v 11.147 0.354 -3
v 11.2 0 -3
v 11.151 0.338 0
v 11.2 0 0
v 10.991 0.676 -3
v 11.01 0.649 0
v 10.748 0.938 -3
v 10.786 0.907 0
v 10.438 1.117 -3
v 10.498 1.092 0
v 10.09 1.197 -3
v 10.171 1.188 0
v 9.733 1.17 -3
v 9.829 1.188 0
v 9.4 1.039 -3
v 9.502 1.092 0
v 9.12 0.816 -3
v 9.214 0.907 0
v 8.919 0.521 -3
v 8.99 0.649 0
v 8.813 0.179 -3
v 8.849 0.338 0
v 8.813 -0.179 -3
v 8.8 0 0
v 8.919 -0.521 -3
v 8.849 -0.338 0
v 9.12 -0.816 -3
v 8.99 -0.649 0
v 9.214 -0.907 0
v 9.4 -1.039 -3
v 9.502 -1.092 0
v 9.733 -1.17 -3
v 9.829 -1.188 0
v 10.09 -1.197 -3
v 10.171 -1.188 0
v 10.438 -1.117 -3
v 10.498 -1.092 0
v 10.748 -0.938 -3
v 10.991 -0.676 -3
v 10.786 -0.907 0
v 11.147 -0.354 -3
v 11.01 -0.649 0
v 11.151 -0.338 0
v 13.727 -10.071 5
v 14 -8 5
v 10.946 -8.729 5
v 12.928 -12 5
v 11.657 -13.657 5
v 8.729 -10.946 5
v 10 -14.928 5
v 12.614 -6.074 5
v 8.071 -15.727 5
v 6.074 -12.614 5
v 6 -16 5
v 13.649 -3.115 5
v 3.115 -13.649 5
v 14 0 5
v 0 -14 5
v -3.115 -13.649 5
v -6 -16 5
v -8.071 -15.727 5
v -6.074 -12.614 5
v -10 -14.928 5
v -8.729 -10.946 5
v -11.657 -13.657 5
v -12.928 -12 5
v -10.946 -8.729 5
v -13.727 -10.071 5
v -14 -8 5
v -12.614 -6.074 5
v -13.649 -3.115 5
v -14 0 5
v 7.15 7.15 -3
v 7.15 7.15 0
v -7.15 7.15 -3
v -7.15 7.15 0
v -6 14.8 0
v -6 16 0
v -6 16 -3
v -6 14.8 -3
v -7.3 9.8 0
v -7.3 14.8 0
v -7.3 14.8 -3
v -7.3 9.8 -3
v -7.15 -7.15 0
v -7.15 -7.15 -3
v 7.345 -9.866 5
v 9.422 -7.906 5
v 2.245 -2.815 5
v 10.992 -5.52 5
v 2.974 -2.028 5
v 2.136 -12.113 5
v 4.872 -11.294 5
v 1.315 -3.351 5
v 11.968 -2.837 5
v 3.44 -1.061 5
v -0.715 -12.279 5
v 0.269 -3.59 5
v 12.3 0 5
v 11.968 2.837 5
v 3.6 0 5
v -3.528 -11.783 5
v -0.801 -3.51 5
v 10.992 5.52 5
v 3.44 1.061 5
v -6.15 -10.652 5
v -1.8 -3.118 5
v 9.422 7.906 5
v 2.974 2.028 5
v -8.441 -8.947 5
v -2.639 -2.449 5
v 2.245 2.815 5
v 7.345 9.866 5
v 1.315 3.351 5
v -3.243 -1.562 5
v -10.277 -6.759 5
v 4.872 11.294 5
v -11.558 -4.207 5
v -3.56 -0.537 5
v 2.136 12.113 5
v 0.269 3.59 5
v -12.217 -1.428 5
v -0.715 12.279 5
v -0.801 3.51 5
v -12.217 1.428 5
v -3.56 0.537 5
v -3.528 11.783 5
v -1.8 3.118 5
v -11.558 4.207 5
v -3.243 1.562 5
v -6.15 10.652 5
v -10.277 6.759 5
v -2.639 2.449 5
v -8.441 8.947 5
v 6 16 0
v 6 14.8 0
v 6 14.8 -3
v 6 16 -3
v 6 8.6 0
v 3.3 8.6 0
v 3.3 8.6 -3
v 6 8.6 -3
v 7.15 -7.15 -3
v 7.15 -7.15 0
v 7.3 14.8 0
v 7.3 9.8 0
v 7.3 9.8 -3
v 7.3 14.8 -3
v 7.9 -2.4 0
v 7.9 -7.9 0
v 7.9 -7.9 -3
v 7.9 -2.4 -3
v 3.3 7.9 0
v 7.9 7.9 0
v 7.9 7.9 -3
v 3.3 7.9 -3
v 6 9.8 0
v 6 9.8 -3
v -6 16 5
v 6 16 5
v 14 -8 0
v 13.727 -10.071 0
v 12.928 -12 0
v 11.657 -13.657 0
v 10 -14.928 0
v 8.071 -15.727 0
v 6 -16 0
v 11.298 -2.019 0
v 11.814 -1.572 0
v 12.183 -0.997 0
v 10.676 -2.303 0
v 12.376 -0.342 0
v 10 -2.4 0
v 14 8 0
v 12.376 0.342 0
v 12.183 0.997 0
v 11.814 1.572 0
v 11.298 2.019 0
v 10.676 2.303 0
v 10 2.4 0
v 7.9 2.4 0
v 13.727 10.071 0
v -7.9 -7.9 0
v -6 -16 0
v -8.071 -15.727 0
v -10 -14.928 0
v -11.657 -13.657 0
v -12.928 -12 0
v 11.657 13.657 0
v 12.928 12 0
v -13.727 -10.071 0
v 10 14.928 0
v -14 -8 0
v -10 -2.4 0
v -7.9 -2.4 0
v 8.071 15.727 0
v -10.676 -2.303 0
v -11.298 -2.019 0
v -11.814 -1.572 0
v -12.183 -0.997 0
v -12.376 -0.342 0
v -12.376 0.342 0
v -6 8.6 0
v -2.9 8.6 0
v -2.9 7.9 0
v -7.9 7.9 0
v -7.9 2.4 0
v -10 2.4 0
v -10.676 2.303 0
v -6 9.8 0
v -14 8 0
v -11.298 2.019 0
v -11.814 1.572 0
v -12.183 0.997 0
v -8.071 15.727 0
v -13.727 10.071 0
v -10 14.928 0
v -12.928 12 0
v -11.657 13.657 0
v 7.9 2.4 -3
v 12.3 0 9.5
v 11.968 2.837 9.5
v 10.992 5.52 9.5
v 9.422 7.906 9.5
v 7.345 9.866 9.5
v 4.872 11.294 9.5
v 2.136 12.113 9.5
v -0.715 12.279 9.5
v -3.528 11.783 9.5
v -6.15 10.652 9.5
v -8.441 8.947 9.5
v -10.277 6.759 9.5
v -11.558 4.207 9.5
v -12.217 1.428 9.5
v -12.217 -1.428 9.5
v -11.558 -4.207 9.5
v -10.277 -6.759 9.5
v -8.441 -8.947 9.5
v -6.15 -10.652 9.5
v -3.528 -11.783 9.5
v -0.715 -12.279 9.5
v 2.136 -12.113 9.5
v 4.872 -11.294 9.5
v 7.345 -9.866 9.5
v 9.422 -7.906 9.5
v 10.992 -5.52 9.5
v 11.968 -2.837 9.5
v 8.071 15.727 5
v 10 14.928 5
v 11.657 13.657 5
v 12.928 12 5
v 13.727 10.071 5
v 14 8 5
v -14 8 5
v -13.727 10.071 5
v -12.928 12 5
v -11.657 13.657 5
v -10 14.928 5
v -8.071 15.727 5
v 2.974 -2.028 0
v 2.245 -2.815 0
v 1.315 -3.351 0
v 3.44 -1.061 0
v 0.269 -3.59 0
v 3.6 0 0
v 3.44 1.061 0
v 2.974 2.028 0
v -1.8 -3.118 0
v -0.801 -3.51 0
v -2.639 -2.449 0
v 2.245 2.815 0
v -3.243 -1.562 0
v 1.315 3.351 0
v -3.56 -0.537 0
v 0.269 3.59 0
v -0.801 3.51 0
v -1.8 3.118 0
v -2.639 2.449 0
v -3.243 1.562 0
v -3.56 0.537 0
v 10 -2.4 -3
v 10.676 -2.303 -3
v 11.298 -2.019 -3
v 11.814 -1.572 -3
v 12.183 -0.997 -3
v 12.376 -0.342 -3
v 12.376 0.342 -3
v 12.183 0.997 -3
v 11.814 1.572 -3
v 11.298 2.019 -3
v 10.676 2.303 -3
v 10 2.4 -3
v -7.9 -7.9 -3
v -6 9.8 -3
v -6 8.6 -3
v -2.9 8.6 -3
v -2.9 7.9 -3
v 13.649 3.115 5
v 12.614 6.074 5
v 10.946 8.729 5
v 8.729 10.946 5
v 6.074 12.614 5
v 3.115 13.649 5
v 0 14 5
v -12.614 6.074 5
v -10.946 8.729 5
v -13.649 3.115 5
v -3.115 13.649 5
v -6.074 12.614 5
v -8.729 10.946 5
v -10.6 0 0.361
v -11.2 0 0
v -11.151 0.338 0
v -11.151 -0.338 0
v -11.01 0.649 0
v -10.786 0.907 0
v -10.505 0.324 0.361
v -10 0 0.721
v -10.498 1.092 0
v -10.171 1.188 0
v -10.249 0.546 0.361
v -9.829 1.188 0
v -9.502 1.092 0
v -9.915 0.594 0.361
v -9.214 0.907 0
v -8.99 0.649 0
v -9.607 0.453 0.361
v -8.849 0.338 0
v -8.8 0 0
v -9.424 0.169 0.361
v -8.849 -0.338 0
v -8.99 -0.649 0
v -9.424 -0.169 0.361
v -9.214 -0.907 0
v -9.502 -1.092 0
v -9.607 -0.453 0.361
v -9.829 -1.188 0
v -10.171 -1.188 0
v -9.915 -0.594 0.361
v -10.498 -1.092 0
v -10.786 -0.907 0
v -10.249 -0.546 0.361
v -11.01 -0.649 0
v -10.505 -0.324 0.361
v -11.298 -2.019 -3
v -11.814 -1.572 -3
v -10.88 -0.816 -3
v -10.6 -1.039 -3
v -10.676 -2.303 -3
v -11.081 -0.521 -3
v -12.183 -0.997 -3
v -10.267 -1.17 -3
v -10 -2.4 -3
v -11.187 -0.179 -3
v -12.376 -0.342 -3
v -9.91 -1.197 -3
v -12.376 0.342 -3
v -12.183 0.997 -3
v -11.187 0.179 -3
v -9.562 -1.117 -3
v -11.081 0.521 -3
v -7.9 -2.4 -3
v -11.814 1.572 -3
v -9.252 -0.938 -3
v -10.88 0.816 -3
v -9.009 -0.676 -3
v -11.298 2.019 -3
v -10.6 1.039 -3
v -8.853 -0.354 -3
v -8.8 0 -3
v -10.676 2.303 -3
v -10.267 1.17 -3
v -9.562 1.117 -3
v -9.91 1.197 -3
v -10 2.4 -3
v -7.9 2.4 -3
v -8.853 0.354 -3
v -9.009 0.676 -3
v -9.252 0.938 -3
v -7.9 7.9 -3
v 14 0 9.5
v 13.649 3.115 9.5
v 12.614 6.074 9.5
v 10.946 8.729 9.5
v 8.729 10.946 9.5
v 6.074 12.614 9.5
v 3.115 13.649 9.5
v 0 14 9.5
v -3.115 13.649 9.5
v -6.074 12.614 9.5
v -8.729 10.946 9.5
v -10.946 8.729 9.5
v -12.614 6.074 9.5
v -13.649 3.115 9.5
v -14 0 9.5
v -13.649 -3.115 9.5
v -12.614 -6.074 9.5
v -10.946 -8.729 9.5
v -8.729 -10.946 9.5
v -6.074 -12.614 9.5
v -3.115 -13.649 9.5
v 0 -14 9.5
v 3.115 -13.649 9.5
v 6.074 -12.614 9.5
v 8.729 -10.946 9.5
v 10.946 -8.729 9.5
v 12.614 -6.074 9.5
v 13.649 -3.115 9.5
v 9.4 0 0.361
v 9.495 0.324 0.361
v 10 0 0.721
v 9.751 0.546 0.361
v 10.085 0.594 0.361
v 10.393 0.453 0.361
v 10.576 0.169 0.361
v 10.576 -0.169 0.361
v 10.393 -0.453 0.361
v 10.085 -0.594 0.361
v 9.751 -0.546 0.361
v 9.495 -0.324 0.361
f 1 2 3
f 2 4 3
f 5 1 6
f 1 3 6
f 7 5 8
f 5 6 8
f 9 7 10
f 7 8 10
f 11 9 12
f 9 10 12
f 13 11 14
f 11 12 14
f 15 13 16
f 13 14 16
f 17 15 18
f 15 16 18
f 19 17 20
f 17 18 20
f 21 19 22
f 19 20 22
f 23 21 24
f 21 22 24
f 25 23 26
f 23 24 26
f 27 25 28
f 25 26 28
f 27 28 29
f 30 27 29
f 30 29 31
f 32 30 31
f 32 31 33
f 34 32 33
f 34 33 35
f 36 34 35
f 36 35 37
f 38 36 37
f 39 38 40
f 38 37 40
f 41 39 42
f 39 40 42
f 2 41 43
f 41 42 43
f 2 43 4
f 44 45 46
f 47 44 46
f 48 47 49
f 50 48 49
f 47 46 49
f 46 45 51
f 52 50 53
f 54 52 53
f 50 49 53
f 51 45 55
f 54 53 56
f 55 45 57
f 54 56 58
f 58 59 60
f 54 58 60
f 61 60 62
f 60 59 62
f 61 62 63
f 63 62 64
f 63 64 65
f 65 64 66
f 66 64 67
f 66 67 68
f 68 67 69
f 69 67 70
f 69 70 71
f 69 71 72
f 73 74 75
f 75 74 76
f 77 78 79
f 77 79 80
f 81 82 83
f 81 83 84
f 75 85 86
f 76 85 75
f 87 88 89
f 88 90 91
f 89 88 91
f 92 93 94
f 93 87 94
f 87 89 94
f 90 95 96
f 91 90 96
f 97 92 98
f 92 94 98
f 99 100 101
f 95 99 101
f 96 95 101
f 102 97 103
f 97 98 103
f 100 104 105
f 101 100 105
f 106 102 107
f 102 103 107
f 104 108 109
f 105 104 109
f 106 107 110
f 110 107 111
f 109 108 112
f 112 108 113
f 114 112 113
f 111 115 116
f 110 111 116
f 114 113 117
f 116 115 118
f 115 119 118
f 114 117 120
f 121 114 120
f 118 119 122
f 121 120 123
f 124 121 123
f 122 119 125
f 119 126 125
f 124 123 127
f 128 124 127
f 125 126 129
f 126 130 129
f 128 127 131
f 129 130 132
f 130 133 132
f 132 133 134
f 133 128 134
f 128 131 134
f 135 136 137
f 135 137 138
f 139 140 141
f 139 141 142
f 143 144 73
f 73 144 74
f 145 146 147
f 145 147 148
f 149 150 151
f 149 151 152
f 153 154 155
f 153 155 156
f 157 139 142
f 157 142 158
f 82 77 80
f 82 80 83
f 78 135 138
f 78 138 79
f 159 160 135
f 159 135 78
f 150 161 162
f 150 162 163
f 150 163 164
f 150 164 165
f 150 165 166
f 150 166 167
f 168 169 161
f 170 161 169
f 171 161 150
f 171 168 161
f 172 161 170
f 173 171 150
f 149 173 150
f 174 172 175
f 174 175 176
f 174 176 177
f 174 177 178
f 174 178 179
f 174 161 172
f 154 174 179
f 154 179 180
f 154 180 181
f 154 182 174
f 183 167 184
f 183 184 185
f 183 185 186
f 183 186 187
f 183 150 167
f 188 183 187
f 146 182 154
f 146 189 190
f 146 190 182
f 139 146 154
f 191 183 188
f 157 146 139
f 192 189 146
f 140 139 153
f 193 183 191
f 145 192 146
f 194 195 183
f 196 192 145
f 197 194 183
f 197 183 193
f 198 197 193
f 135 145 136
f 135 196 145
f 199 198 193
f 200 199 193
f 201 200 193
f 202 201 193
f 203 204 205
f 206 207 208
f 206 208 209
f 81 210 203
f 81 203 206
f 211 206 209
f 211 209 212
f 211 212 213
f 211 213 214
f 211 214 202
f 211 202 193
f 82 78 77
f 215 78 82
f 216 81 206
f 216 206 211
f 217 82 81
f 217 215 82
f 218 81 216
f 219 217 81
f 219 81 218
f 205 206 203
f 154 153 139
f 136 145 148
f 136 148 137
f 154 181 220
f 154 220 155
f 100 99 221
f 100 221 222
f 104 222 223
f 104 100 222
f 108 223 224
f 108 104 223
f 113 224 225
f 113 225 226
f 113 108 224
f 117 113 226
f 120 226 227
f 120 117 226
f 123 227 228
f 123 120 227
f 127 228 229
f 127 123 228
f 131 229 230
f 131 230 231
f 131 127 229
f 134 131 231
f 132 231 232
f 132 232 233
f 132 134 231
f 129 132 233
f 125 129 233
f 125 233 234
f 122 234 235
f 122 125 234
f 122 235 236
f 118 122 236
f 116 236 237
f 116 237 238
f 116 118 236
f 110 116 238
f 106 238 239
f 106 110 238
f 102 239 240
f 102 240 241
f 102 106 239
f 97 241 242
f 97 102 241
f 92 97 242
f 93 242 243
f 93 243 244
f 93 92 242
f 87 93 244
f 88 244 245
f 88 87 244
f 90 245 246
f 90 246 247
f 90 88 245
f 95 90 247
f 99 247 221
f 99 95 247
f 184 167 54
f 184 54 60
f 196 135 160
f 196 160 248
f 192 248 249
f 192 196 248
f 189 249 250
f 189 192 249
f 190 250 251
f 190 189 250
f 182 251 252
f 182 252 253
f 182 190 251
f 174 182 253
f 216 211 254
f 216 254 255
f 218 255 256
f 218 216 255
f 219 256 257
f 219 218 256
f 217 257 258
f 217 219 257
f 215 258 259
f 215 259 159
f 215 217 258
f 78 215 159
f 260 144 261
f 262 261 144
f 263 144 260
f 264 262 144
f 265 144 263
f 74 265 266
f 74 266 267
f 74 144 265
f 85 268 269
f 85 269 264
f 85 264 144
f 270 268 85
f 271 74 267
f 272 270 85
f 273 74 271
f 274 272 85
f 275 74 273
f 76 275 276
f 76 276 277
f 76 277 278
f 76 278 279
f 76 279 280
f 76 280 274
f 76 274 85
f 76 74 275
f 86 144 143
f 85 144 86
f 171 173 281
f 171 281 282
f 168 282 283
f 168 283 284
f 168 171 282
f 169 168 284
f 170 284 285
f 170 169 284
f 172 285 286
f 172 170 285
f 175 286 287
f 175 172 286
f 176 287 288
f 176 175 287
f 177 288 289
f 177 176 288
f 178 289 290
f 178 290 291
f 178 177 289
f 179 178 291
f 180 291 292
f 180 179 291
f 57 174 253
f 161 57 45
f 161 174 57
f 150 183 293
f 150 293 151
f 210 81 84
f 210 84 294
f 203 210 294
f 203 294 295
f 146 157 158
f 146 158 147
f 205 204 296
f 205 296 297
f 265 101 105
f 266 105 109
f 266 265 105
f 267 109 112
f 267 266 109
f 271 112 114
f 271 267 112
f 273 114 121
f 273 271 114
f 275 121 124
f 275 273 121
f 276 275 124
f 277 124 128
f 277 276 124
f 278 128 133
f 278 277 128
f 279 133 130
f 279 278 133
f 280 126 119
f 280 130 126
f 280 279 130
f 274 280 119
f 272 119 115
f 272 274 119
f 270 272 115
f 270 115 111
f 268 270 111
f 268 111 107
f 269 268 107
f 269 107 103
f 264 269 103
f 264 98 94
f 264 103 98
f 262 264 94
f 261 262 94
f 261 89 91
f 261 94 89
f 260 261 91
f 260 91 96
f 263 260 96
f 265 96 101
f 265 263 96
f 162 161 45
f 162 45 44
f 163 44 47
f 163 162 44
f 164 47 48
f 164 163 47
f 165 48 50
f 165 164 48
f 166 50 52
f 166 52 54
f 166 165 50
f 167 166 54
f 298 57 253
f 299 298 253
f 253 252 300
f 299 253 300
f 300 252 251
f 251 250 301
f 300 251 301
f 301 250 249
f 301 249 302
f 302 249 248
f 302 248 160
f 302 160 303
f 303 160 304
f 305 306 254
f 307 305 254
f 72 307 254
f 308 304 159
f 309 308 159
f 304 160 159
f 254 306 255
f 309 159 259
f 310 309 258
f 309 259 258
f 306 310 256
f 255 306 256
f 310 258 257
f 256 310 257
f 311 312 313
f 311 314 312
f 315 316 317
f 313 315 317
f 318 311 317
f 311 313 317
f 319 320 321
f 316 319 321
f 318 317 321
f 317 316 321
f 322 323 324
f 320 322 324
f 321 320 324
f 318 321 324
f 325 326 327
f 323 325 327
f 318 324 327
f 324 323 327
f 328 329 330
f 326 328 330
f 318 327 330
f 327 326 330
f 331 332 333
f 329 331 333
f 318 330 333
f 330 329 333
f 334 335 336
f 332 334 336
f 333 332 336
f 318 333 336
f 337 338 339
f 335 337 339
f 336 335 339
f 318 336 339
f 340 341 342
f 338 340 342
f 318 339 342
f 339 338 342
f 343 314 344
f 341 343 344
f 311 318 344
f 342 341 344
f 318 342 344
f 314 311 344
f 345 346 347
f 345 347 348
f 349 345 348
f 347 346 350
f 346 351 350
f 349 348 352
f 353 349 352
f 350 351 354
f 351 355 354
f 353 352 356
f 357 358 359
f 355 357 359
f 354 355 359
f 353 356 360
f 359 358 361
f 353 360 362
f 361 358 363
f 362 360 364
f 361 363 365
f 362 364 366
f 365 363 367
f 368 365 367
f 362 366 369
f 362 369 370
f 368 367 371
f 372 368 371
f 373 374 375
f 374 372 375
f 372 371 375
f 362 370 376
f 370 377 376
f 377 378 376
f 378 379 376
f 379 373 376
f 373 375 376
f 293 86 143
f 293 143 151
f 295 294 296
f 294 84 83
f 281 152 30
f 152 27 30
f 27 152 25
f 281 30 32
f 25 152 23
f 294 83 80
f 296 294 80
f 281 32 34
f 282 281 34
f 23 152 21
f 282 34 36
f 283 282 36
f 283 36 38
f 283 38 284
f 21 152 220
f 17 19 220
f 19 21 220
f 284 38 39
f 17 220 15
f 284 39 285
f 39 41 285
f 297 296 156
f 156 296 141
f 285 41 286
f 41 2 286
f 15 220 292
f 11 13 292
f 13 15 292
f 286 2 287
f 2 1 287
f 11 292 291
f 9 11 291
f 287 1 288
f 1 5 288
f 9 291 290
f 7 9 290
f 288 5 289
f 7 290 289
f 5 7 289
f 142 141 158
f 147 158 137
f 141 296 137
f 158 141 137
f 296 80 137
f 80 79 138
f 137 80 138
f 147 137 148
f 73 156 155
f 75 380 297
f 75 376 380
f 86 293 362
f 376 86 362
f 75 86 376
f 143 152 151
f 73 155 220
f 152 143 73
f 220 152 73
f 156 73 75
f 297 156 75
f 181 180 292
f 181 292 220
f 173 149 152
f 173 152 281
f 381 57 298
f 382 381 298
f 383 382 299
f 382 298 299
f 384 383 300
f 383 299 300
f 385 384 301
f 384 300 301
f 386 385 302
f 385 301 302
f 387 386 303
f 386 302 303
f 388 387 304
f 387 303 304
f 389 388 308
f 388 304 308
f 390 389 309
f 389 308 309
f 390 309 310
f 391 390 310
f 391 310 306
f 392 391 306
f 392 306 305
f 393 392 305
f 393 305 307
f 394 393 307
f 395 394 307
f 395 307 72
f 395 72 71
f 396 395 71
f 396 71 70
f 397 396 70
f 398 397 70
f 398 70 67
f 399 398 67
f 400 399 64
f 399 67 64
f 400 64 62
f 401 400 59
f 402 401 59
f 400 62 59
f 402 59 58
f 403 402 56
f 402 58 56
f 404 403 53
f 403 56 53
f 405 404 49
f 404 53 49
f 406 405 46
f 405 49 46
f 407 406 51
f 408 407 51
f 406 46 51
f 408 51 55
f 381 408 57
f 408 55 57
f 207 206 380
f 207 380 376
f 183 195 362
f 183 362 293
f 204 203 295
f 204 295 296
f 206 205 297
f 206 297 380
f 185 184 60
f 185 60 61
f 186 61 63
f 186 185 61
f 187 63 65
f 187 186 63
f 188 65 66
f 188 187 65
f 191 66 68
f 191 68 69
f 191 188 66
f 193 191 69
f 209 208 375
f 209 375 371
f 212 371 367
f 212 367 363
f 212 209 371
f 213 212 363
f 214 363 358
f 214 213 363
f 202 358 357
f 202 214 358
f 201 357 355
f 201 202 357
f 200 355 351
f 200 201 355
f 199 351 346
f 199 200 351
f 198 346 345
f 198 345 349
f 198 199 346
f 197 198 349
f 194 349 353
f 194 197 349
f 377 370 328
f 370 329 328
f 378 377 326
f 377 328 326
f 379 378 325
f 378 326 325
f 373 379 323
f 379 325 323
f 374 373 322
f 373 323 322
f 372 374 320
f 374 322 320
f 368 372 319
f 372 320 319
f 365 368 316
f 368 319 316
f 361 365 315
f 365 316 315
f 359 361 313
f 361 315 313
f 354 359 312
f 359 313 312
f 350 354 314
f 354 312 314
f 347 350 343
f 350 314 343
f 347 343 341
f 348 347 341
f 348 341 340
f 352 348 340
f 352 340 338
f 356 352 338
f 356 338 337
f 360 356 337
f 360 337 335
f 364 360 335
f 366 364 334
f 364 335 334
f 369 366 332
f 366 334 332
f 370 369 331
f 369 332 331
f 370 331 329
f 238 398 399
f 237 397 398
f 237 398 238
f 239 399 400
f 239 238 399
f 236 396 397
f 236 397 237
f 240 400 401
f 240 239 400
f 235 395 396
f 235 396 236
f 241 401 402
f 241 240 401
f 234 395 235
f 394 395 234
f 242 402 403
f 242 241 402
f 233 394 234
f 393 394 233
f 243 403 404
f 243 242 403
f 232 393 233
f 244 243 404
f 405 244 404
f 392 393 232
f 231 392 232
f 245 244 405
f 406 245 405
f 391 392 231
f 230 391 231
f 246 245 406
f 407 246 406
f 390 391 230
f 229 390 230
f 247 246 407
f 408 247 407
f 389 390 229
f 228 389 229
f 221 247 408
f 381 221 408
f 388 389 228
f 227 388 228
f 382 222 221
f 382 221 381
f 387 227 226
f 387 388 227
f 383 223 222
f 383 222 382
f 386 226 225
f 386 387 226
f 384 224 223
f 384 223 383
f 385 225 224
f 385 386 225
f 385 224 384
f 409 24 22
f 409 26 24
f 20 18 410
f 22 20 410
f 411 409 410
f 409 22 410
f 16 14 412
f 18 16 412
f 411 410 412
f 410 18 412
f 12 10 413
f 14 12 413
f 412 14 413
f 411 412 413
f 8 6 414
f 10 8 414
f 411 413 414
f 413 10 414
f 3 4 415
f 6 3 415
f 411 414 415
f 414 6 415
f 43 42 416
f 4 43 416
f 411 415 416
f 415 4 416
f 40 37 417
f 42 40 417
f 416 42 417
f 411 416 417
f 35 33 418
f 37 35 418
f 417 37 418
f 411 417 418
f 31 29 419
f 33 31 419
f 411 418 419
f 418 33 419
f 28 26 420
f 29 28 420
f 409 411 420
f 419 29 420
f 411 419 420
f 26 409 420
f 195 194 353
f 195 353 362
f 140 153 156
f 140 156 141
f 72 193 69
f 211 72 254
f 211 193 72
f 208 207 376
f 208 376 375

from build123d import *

# Parameters (mm, degrees)
EXTRUDE_1_DEPTH        = 5
SKETCH_2_R             = 14
SKETCH_2_R_2           = 12.3
EXTRUDE_2_DEPTH        = 4.5
SKETCH_3_W             = 14.3
SKETCH_3_H             = 14.3
EXTRUDE_3_DEPTH        = 3
SKETCH_4_R             = 3.6
CUT_EXTRUDE_2_DEPTH    = 24.286262044
HOLE_WIZARD_M2_1_D     = 2.4
HOLE_WIZARD_M2_1_DEPTH = 3
HOLE_WIZARD_M2_1_TIP   = 0.721032743


with BuildPart() as part:
    # 스케치1 → 보스-돌출1 (new body)
    with BuildSketch(Plane.XY):
        with BuildLine():
            Line((-6, 16), (6, 16))
            ThreePointArc((6, 16), (11.656854249, 13.656854249), (14, 8))
            Line((14, 8), (14, -8))
            ThreePointArc((14, -8), (11.656854249, -13.656854249), (6, -16))
            Line((6, -16), (-6, -16))
            ThreePointArc((-6, -16), (-11.656854249, -13.656854249), (-14, -8))
            Line((-14, -8), (-14, 8))
            ThreePointArc((-14, 8), (-11.656854249, 13.656854249), (-6, 16))
        make_face()
    extrude(amount=EXTRUDE_1_DEPTH)

    # 스케치2 → 보스-돌출2 (add)
    with BuildSketch(Plane.XY.offset(5)):
        Circle(SKETCH_2_R)
        Circle(SKETCH_2_R_2, mode=Mode.SUBTRACT)
    extrude(amount=EXTRUDE_2_DEPTH)

    # 스케치3 → 보스-돌출3 (add)
    with BuildSketch(Plane(origin=(0, 0, 0), x_dir=(-1, 0, 0), z_dir=(0, 0, -1))):
        with BuildLine():
            Line((-7.9, 7.9), (-3.3, 7.9))
            Line((-3.3, 7.9), (-3.3, 8.6))
            Line((-3.3, 8.6), (-6, 8.6))
            Line((-6, 8.6), (-6, 9.8))
            Line((-6, 9.8), (-7.3, 9.8))
            Line((-7.3, 9.8), (-7.3, 14.8))
            Line((-7.3, 14.8), (-6, 14.8))
            Line((-6, 14.8), (-6, 16))
            Line((-6, 16), (6, 16))
            Line((6, 16), (6, 14.8))
            Line((6, 14.8), (7.3, 14.8))
            Line((7.3, 14.8), (7.3, 9.8))
            Line((7.3, 9.8), (6, 9.8))
            Line((6, 9.8), (6, 8.6))
            Line((6, 8.6), (2.9, 8.6))
            Line((2.9, 8.6), (2.9, 7.9))
            Line((2.9, 7.9), (7.9, 7.9))
            Line((7.9, 7.9), (7.9, 2.4))
            Line((7.9, 2.4), (10, 2.4))
            ThreePointArc((10, 2.4), (12.4, 0), (10, -2.4))
            Line((10, -2.4), (7.9, -2.4))
            Line((7.9, -2.4), (7.9, -7.9))
            Line((7.9, -7.9), (-7.9, -7.9))
            Line((-7.9, -7.9), (-7.9, -2.4))
            Line((-7.9, -2.4), (-10, -2.4))
            ThreePointArc((-10, -2.4), (-12.4, 0), (-10, 2.4))
            Line((-10, 2.4), (-7.9, 2.4))
            Line((-7.9, 2.4), (-7.9, 7.9))
        make_face()
        Rectangle(SKETCH_3_W, SKETCH_3_H, mode=Mode.SUBTRACT)
    extrude(amount=EXTRUDE_3_DEPTH)

    # 스케치4 → 컷-돌출2 (cut, through all)
    with BuildSketch(Plane.XY):
        Circle(SKETCH_4_R)
    extrude(amount=CUT_EXTRUDE_2_DEPTH, mode=Mode.SUBTRACT)

    # M2 여유 구멍1
    with Locations(Plane(origin=(-10, 0, -3), x_dir=(-1, 0, 0), z_dir=(0, 0, -1))):
        with Locations((0, 0), (-20, 0)):
            Hole(HOLE_WIZARD_M2_1_D / 2, depth=HOLE_WIZARD_M2_1_DEPTH)
            with Locations((0, 0, -(HOLE_WIZARD_M2_1_DEPTH + HOLE_WIZARD_M2_1_TIP / 2))):  # 118° drill point
                Cone(0, HOLE_WIZARD_M2_1_D / 2, HOLE_WIZARD_M2_1_TIP, mode=Mode.SUBTRACT)


solid = part.part
